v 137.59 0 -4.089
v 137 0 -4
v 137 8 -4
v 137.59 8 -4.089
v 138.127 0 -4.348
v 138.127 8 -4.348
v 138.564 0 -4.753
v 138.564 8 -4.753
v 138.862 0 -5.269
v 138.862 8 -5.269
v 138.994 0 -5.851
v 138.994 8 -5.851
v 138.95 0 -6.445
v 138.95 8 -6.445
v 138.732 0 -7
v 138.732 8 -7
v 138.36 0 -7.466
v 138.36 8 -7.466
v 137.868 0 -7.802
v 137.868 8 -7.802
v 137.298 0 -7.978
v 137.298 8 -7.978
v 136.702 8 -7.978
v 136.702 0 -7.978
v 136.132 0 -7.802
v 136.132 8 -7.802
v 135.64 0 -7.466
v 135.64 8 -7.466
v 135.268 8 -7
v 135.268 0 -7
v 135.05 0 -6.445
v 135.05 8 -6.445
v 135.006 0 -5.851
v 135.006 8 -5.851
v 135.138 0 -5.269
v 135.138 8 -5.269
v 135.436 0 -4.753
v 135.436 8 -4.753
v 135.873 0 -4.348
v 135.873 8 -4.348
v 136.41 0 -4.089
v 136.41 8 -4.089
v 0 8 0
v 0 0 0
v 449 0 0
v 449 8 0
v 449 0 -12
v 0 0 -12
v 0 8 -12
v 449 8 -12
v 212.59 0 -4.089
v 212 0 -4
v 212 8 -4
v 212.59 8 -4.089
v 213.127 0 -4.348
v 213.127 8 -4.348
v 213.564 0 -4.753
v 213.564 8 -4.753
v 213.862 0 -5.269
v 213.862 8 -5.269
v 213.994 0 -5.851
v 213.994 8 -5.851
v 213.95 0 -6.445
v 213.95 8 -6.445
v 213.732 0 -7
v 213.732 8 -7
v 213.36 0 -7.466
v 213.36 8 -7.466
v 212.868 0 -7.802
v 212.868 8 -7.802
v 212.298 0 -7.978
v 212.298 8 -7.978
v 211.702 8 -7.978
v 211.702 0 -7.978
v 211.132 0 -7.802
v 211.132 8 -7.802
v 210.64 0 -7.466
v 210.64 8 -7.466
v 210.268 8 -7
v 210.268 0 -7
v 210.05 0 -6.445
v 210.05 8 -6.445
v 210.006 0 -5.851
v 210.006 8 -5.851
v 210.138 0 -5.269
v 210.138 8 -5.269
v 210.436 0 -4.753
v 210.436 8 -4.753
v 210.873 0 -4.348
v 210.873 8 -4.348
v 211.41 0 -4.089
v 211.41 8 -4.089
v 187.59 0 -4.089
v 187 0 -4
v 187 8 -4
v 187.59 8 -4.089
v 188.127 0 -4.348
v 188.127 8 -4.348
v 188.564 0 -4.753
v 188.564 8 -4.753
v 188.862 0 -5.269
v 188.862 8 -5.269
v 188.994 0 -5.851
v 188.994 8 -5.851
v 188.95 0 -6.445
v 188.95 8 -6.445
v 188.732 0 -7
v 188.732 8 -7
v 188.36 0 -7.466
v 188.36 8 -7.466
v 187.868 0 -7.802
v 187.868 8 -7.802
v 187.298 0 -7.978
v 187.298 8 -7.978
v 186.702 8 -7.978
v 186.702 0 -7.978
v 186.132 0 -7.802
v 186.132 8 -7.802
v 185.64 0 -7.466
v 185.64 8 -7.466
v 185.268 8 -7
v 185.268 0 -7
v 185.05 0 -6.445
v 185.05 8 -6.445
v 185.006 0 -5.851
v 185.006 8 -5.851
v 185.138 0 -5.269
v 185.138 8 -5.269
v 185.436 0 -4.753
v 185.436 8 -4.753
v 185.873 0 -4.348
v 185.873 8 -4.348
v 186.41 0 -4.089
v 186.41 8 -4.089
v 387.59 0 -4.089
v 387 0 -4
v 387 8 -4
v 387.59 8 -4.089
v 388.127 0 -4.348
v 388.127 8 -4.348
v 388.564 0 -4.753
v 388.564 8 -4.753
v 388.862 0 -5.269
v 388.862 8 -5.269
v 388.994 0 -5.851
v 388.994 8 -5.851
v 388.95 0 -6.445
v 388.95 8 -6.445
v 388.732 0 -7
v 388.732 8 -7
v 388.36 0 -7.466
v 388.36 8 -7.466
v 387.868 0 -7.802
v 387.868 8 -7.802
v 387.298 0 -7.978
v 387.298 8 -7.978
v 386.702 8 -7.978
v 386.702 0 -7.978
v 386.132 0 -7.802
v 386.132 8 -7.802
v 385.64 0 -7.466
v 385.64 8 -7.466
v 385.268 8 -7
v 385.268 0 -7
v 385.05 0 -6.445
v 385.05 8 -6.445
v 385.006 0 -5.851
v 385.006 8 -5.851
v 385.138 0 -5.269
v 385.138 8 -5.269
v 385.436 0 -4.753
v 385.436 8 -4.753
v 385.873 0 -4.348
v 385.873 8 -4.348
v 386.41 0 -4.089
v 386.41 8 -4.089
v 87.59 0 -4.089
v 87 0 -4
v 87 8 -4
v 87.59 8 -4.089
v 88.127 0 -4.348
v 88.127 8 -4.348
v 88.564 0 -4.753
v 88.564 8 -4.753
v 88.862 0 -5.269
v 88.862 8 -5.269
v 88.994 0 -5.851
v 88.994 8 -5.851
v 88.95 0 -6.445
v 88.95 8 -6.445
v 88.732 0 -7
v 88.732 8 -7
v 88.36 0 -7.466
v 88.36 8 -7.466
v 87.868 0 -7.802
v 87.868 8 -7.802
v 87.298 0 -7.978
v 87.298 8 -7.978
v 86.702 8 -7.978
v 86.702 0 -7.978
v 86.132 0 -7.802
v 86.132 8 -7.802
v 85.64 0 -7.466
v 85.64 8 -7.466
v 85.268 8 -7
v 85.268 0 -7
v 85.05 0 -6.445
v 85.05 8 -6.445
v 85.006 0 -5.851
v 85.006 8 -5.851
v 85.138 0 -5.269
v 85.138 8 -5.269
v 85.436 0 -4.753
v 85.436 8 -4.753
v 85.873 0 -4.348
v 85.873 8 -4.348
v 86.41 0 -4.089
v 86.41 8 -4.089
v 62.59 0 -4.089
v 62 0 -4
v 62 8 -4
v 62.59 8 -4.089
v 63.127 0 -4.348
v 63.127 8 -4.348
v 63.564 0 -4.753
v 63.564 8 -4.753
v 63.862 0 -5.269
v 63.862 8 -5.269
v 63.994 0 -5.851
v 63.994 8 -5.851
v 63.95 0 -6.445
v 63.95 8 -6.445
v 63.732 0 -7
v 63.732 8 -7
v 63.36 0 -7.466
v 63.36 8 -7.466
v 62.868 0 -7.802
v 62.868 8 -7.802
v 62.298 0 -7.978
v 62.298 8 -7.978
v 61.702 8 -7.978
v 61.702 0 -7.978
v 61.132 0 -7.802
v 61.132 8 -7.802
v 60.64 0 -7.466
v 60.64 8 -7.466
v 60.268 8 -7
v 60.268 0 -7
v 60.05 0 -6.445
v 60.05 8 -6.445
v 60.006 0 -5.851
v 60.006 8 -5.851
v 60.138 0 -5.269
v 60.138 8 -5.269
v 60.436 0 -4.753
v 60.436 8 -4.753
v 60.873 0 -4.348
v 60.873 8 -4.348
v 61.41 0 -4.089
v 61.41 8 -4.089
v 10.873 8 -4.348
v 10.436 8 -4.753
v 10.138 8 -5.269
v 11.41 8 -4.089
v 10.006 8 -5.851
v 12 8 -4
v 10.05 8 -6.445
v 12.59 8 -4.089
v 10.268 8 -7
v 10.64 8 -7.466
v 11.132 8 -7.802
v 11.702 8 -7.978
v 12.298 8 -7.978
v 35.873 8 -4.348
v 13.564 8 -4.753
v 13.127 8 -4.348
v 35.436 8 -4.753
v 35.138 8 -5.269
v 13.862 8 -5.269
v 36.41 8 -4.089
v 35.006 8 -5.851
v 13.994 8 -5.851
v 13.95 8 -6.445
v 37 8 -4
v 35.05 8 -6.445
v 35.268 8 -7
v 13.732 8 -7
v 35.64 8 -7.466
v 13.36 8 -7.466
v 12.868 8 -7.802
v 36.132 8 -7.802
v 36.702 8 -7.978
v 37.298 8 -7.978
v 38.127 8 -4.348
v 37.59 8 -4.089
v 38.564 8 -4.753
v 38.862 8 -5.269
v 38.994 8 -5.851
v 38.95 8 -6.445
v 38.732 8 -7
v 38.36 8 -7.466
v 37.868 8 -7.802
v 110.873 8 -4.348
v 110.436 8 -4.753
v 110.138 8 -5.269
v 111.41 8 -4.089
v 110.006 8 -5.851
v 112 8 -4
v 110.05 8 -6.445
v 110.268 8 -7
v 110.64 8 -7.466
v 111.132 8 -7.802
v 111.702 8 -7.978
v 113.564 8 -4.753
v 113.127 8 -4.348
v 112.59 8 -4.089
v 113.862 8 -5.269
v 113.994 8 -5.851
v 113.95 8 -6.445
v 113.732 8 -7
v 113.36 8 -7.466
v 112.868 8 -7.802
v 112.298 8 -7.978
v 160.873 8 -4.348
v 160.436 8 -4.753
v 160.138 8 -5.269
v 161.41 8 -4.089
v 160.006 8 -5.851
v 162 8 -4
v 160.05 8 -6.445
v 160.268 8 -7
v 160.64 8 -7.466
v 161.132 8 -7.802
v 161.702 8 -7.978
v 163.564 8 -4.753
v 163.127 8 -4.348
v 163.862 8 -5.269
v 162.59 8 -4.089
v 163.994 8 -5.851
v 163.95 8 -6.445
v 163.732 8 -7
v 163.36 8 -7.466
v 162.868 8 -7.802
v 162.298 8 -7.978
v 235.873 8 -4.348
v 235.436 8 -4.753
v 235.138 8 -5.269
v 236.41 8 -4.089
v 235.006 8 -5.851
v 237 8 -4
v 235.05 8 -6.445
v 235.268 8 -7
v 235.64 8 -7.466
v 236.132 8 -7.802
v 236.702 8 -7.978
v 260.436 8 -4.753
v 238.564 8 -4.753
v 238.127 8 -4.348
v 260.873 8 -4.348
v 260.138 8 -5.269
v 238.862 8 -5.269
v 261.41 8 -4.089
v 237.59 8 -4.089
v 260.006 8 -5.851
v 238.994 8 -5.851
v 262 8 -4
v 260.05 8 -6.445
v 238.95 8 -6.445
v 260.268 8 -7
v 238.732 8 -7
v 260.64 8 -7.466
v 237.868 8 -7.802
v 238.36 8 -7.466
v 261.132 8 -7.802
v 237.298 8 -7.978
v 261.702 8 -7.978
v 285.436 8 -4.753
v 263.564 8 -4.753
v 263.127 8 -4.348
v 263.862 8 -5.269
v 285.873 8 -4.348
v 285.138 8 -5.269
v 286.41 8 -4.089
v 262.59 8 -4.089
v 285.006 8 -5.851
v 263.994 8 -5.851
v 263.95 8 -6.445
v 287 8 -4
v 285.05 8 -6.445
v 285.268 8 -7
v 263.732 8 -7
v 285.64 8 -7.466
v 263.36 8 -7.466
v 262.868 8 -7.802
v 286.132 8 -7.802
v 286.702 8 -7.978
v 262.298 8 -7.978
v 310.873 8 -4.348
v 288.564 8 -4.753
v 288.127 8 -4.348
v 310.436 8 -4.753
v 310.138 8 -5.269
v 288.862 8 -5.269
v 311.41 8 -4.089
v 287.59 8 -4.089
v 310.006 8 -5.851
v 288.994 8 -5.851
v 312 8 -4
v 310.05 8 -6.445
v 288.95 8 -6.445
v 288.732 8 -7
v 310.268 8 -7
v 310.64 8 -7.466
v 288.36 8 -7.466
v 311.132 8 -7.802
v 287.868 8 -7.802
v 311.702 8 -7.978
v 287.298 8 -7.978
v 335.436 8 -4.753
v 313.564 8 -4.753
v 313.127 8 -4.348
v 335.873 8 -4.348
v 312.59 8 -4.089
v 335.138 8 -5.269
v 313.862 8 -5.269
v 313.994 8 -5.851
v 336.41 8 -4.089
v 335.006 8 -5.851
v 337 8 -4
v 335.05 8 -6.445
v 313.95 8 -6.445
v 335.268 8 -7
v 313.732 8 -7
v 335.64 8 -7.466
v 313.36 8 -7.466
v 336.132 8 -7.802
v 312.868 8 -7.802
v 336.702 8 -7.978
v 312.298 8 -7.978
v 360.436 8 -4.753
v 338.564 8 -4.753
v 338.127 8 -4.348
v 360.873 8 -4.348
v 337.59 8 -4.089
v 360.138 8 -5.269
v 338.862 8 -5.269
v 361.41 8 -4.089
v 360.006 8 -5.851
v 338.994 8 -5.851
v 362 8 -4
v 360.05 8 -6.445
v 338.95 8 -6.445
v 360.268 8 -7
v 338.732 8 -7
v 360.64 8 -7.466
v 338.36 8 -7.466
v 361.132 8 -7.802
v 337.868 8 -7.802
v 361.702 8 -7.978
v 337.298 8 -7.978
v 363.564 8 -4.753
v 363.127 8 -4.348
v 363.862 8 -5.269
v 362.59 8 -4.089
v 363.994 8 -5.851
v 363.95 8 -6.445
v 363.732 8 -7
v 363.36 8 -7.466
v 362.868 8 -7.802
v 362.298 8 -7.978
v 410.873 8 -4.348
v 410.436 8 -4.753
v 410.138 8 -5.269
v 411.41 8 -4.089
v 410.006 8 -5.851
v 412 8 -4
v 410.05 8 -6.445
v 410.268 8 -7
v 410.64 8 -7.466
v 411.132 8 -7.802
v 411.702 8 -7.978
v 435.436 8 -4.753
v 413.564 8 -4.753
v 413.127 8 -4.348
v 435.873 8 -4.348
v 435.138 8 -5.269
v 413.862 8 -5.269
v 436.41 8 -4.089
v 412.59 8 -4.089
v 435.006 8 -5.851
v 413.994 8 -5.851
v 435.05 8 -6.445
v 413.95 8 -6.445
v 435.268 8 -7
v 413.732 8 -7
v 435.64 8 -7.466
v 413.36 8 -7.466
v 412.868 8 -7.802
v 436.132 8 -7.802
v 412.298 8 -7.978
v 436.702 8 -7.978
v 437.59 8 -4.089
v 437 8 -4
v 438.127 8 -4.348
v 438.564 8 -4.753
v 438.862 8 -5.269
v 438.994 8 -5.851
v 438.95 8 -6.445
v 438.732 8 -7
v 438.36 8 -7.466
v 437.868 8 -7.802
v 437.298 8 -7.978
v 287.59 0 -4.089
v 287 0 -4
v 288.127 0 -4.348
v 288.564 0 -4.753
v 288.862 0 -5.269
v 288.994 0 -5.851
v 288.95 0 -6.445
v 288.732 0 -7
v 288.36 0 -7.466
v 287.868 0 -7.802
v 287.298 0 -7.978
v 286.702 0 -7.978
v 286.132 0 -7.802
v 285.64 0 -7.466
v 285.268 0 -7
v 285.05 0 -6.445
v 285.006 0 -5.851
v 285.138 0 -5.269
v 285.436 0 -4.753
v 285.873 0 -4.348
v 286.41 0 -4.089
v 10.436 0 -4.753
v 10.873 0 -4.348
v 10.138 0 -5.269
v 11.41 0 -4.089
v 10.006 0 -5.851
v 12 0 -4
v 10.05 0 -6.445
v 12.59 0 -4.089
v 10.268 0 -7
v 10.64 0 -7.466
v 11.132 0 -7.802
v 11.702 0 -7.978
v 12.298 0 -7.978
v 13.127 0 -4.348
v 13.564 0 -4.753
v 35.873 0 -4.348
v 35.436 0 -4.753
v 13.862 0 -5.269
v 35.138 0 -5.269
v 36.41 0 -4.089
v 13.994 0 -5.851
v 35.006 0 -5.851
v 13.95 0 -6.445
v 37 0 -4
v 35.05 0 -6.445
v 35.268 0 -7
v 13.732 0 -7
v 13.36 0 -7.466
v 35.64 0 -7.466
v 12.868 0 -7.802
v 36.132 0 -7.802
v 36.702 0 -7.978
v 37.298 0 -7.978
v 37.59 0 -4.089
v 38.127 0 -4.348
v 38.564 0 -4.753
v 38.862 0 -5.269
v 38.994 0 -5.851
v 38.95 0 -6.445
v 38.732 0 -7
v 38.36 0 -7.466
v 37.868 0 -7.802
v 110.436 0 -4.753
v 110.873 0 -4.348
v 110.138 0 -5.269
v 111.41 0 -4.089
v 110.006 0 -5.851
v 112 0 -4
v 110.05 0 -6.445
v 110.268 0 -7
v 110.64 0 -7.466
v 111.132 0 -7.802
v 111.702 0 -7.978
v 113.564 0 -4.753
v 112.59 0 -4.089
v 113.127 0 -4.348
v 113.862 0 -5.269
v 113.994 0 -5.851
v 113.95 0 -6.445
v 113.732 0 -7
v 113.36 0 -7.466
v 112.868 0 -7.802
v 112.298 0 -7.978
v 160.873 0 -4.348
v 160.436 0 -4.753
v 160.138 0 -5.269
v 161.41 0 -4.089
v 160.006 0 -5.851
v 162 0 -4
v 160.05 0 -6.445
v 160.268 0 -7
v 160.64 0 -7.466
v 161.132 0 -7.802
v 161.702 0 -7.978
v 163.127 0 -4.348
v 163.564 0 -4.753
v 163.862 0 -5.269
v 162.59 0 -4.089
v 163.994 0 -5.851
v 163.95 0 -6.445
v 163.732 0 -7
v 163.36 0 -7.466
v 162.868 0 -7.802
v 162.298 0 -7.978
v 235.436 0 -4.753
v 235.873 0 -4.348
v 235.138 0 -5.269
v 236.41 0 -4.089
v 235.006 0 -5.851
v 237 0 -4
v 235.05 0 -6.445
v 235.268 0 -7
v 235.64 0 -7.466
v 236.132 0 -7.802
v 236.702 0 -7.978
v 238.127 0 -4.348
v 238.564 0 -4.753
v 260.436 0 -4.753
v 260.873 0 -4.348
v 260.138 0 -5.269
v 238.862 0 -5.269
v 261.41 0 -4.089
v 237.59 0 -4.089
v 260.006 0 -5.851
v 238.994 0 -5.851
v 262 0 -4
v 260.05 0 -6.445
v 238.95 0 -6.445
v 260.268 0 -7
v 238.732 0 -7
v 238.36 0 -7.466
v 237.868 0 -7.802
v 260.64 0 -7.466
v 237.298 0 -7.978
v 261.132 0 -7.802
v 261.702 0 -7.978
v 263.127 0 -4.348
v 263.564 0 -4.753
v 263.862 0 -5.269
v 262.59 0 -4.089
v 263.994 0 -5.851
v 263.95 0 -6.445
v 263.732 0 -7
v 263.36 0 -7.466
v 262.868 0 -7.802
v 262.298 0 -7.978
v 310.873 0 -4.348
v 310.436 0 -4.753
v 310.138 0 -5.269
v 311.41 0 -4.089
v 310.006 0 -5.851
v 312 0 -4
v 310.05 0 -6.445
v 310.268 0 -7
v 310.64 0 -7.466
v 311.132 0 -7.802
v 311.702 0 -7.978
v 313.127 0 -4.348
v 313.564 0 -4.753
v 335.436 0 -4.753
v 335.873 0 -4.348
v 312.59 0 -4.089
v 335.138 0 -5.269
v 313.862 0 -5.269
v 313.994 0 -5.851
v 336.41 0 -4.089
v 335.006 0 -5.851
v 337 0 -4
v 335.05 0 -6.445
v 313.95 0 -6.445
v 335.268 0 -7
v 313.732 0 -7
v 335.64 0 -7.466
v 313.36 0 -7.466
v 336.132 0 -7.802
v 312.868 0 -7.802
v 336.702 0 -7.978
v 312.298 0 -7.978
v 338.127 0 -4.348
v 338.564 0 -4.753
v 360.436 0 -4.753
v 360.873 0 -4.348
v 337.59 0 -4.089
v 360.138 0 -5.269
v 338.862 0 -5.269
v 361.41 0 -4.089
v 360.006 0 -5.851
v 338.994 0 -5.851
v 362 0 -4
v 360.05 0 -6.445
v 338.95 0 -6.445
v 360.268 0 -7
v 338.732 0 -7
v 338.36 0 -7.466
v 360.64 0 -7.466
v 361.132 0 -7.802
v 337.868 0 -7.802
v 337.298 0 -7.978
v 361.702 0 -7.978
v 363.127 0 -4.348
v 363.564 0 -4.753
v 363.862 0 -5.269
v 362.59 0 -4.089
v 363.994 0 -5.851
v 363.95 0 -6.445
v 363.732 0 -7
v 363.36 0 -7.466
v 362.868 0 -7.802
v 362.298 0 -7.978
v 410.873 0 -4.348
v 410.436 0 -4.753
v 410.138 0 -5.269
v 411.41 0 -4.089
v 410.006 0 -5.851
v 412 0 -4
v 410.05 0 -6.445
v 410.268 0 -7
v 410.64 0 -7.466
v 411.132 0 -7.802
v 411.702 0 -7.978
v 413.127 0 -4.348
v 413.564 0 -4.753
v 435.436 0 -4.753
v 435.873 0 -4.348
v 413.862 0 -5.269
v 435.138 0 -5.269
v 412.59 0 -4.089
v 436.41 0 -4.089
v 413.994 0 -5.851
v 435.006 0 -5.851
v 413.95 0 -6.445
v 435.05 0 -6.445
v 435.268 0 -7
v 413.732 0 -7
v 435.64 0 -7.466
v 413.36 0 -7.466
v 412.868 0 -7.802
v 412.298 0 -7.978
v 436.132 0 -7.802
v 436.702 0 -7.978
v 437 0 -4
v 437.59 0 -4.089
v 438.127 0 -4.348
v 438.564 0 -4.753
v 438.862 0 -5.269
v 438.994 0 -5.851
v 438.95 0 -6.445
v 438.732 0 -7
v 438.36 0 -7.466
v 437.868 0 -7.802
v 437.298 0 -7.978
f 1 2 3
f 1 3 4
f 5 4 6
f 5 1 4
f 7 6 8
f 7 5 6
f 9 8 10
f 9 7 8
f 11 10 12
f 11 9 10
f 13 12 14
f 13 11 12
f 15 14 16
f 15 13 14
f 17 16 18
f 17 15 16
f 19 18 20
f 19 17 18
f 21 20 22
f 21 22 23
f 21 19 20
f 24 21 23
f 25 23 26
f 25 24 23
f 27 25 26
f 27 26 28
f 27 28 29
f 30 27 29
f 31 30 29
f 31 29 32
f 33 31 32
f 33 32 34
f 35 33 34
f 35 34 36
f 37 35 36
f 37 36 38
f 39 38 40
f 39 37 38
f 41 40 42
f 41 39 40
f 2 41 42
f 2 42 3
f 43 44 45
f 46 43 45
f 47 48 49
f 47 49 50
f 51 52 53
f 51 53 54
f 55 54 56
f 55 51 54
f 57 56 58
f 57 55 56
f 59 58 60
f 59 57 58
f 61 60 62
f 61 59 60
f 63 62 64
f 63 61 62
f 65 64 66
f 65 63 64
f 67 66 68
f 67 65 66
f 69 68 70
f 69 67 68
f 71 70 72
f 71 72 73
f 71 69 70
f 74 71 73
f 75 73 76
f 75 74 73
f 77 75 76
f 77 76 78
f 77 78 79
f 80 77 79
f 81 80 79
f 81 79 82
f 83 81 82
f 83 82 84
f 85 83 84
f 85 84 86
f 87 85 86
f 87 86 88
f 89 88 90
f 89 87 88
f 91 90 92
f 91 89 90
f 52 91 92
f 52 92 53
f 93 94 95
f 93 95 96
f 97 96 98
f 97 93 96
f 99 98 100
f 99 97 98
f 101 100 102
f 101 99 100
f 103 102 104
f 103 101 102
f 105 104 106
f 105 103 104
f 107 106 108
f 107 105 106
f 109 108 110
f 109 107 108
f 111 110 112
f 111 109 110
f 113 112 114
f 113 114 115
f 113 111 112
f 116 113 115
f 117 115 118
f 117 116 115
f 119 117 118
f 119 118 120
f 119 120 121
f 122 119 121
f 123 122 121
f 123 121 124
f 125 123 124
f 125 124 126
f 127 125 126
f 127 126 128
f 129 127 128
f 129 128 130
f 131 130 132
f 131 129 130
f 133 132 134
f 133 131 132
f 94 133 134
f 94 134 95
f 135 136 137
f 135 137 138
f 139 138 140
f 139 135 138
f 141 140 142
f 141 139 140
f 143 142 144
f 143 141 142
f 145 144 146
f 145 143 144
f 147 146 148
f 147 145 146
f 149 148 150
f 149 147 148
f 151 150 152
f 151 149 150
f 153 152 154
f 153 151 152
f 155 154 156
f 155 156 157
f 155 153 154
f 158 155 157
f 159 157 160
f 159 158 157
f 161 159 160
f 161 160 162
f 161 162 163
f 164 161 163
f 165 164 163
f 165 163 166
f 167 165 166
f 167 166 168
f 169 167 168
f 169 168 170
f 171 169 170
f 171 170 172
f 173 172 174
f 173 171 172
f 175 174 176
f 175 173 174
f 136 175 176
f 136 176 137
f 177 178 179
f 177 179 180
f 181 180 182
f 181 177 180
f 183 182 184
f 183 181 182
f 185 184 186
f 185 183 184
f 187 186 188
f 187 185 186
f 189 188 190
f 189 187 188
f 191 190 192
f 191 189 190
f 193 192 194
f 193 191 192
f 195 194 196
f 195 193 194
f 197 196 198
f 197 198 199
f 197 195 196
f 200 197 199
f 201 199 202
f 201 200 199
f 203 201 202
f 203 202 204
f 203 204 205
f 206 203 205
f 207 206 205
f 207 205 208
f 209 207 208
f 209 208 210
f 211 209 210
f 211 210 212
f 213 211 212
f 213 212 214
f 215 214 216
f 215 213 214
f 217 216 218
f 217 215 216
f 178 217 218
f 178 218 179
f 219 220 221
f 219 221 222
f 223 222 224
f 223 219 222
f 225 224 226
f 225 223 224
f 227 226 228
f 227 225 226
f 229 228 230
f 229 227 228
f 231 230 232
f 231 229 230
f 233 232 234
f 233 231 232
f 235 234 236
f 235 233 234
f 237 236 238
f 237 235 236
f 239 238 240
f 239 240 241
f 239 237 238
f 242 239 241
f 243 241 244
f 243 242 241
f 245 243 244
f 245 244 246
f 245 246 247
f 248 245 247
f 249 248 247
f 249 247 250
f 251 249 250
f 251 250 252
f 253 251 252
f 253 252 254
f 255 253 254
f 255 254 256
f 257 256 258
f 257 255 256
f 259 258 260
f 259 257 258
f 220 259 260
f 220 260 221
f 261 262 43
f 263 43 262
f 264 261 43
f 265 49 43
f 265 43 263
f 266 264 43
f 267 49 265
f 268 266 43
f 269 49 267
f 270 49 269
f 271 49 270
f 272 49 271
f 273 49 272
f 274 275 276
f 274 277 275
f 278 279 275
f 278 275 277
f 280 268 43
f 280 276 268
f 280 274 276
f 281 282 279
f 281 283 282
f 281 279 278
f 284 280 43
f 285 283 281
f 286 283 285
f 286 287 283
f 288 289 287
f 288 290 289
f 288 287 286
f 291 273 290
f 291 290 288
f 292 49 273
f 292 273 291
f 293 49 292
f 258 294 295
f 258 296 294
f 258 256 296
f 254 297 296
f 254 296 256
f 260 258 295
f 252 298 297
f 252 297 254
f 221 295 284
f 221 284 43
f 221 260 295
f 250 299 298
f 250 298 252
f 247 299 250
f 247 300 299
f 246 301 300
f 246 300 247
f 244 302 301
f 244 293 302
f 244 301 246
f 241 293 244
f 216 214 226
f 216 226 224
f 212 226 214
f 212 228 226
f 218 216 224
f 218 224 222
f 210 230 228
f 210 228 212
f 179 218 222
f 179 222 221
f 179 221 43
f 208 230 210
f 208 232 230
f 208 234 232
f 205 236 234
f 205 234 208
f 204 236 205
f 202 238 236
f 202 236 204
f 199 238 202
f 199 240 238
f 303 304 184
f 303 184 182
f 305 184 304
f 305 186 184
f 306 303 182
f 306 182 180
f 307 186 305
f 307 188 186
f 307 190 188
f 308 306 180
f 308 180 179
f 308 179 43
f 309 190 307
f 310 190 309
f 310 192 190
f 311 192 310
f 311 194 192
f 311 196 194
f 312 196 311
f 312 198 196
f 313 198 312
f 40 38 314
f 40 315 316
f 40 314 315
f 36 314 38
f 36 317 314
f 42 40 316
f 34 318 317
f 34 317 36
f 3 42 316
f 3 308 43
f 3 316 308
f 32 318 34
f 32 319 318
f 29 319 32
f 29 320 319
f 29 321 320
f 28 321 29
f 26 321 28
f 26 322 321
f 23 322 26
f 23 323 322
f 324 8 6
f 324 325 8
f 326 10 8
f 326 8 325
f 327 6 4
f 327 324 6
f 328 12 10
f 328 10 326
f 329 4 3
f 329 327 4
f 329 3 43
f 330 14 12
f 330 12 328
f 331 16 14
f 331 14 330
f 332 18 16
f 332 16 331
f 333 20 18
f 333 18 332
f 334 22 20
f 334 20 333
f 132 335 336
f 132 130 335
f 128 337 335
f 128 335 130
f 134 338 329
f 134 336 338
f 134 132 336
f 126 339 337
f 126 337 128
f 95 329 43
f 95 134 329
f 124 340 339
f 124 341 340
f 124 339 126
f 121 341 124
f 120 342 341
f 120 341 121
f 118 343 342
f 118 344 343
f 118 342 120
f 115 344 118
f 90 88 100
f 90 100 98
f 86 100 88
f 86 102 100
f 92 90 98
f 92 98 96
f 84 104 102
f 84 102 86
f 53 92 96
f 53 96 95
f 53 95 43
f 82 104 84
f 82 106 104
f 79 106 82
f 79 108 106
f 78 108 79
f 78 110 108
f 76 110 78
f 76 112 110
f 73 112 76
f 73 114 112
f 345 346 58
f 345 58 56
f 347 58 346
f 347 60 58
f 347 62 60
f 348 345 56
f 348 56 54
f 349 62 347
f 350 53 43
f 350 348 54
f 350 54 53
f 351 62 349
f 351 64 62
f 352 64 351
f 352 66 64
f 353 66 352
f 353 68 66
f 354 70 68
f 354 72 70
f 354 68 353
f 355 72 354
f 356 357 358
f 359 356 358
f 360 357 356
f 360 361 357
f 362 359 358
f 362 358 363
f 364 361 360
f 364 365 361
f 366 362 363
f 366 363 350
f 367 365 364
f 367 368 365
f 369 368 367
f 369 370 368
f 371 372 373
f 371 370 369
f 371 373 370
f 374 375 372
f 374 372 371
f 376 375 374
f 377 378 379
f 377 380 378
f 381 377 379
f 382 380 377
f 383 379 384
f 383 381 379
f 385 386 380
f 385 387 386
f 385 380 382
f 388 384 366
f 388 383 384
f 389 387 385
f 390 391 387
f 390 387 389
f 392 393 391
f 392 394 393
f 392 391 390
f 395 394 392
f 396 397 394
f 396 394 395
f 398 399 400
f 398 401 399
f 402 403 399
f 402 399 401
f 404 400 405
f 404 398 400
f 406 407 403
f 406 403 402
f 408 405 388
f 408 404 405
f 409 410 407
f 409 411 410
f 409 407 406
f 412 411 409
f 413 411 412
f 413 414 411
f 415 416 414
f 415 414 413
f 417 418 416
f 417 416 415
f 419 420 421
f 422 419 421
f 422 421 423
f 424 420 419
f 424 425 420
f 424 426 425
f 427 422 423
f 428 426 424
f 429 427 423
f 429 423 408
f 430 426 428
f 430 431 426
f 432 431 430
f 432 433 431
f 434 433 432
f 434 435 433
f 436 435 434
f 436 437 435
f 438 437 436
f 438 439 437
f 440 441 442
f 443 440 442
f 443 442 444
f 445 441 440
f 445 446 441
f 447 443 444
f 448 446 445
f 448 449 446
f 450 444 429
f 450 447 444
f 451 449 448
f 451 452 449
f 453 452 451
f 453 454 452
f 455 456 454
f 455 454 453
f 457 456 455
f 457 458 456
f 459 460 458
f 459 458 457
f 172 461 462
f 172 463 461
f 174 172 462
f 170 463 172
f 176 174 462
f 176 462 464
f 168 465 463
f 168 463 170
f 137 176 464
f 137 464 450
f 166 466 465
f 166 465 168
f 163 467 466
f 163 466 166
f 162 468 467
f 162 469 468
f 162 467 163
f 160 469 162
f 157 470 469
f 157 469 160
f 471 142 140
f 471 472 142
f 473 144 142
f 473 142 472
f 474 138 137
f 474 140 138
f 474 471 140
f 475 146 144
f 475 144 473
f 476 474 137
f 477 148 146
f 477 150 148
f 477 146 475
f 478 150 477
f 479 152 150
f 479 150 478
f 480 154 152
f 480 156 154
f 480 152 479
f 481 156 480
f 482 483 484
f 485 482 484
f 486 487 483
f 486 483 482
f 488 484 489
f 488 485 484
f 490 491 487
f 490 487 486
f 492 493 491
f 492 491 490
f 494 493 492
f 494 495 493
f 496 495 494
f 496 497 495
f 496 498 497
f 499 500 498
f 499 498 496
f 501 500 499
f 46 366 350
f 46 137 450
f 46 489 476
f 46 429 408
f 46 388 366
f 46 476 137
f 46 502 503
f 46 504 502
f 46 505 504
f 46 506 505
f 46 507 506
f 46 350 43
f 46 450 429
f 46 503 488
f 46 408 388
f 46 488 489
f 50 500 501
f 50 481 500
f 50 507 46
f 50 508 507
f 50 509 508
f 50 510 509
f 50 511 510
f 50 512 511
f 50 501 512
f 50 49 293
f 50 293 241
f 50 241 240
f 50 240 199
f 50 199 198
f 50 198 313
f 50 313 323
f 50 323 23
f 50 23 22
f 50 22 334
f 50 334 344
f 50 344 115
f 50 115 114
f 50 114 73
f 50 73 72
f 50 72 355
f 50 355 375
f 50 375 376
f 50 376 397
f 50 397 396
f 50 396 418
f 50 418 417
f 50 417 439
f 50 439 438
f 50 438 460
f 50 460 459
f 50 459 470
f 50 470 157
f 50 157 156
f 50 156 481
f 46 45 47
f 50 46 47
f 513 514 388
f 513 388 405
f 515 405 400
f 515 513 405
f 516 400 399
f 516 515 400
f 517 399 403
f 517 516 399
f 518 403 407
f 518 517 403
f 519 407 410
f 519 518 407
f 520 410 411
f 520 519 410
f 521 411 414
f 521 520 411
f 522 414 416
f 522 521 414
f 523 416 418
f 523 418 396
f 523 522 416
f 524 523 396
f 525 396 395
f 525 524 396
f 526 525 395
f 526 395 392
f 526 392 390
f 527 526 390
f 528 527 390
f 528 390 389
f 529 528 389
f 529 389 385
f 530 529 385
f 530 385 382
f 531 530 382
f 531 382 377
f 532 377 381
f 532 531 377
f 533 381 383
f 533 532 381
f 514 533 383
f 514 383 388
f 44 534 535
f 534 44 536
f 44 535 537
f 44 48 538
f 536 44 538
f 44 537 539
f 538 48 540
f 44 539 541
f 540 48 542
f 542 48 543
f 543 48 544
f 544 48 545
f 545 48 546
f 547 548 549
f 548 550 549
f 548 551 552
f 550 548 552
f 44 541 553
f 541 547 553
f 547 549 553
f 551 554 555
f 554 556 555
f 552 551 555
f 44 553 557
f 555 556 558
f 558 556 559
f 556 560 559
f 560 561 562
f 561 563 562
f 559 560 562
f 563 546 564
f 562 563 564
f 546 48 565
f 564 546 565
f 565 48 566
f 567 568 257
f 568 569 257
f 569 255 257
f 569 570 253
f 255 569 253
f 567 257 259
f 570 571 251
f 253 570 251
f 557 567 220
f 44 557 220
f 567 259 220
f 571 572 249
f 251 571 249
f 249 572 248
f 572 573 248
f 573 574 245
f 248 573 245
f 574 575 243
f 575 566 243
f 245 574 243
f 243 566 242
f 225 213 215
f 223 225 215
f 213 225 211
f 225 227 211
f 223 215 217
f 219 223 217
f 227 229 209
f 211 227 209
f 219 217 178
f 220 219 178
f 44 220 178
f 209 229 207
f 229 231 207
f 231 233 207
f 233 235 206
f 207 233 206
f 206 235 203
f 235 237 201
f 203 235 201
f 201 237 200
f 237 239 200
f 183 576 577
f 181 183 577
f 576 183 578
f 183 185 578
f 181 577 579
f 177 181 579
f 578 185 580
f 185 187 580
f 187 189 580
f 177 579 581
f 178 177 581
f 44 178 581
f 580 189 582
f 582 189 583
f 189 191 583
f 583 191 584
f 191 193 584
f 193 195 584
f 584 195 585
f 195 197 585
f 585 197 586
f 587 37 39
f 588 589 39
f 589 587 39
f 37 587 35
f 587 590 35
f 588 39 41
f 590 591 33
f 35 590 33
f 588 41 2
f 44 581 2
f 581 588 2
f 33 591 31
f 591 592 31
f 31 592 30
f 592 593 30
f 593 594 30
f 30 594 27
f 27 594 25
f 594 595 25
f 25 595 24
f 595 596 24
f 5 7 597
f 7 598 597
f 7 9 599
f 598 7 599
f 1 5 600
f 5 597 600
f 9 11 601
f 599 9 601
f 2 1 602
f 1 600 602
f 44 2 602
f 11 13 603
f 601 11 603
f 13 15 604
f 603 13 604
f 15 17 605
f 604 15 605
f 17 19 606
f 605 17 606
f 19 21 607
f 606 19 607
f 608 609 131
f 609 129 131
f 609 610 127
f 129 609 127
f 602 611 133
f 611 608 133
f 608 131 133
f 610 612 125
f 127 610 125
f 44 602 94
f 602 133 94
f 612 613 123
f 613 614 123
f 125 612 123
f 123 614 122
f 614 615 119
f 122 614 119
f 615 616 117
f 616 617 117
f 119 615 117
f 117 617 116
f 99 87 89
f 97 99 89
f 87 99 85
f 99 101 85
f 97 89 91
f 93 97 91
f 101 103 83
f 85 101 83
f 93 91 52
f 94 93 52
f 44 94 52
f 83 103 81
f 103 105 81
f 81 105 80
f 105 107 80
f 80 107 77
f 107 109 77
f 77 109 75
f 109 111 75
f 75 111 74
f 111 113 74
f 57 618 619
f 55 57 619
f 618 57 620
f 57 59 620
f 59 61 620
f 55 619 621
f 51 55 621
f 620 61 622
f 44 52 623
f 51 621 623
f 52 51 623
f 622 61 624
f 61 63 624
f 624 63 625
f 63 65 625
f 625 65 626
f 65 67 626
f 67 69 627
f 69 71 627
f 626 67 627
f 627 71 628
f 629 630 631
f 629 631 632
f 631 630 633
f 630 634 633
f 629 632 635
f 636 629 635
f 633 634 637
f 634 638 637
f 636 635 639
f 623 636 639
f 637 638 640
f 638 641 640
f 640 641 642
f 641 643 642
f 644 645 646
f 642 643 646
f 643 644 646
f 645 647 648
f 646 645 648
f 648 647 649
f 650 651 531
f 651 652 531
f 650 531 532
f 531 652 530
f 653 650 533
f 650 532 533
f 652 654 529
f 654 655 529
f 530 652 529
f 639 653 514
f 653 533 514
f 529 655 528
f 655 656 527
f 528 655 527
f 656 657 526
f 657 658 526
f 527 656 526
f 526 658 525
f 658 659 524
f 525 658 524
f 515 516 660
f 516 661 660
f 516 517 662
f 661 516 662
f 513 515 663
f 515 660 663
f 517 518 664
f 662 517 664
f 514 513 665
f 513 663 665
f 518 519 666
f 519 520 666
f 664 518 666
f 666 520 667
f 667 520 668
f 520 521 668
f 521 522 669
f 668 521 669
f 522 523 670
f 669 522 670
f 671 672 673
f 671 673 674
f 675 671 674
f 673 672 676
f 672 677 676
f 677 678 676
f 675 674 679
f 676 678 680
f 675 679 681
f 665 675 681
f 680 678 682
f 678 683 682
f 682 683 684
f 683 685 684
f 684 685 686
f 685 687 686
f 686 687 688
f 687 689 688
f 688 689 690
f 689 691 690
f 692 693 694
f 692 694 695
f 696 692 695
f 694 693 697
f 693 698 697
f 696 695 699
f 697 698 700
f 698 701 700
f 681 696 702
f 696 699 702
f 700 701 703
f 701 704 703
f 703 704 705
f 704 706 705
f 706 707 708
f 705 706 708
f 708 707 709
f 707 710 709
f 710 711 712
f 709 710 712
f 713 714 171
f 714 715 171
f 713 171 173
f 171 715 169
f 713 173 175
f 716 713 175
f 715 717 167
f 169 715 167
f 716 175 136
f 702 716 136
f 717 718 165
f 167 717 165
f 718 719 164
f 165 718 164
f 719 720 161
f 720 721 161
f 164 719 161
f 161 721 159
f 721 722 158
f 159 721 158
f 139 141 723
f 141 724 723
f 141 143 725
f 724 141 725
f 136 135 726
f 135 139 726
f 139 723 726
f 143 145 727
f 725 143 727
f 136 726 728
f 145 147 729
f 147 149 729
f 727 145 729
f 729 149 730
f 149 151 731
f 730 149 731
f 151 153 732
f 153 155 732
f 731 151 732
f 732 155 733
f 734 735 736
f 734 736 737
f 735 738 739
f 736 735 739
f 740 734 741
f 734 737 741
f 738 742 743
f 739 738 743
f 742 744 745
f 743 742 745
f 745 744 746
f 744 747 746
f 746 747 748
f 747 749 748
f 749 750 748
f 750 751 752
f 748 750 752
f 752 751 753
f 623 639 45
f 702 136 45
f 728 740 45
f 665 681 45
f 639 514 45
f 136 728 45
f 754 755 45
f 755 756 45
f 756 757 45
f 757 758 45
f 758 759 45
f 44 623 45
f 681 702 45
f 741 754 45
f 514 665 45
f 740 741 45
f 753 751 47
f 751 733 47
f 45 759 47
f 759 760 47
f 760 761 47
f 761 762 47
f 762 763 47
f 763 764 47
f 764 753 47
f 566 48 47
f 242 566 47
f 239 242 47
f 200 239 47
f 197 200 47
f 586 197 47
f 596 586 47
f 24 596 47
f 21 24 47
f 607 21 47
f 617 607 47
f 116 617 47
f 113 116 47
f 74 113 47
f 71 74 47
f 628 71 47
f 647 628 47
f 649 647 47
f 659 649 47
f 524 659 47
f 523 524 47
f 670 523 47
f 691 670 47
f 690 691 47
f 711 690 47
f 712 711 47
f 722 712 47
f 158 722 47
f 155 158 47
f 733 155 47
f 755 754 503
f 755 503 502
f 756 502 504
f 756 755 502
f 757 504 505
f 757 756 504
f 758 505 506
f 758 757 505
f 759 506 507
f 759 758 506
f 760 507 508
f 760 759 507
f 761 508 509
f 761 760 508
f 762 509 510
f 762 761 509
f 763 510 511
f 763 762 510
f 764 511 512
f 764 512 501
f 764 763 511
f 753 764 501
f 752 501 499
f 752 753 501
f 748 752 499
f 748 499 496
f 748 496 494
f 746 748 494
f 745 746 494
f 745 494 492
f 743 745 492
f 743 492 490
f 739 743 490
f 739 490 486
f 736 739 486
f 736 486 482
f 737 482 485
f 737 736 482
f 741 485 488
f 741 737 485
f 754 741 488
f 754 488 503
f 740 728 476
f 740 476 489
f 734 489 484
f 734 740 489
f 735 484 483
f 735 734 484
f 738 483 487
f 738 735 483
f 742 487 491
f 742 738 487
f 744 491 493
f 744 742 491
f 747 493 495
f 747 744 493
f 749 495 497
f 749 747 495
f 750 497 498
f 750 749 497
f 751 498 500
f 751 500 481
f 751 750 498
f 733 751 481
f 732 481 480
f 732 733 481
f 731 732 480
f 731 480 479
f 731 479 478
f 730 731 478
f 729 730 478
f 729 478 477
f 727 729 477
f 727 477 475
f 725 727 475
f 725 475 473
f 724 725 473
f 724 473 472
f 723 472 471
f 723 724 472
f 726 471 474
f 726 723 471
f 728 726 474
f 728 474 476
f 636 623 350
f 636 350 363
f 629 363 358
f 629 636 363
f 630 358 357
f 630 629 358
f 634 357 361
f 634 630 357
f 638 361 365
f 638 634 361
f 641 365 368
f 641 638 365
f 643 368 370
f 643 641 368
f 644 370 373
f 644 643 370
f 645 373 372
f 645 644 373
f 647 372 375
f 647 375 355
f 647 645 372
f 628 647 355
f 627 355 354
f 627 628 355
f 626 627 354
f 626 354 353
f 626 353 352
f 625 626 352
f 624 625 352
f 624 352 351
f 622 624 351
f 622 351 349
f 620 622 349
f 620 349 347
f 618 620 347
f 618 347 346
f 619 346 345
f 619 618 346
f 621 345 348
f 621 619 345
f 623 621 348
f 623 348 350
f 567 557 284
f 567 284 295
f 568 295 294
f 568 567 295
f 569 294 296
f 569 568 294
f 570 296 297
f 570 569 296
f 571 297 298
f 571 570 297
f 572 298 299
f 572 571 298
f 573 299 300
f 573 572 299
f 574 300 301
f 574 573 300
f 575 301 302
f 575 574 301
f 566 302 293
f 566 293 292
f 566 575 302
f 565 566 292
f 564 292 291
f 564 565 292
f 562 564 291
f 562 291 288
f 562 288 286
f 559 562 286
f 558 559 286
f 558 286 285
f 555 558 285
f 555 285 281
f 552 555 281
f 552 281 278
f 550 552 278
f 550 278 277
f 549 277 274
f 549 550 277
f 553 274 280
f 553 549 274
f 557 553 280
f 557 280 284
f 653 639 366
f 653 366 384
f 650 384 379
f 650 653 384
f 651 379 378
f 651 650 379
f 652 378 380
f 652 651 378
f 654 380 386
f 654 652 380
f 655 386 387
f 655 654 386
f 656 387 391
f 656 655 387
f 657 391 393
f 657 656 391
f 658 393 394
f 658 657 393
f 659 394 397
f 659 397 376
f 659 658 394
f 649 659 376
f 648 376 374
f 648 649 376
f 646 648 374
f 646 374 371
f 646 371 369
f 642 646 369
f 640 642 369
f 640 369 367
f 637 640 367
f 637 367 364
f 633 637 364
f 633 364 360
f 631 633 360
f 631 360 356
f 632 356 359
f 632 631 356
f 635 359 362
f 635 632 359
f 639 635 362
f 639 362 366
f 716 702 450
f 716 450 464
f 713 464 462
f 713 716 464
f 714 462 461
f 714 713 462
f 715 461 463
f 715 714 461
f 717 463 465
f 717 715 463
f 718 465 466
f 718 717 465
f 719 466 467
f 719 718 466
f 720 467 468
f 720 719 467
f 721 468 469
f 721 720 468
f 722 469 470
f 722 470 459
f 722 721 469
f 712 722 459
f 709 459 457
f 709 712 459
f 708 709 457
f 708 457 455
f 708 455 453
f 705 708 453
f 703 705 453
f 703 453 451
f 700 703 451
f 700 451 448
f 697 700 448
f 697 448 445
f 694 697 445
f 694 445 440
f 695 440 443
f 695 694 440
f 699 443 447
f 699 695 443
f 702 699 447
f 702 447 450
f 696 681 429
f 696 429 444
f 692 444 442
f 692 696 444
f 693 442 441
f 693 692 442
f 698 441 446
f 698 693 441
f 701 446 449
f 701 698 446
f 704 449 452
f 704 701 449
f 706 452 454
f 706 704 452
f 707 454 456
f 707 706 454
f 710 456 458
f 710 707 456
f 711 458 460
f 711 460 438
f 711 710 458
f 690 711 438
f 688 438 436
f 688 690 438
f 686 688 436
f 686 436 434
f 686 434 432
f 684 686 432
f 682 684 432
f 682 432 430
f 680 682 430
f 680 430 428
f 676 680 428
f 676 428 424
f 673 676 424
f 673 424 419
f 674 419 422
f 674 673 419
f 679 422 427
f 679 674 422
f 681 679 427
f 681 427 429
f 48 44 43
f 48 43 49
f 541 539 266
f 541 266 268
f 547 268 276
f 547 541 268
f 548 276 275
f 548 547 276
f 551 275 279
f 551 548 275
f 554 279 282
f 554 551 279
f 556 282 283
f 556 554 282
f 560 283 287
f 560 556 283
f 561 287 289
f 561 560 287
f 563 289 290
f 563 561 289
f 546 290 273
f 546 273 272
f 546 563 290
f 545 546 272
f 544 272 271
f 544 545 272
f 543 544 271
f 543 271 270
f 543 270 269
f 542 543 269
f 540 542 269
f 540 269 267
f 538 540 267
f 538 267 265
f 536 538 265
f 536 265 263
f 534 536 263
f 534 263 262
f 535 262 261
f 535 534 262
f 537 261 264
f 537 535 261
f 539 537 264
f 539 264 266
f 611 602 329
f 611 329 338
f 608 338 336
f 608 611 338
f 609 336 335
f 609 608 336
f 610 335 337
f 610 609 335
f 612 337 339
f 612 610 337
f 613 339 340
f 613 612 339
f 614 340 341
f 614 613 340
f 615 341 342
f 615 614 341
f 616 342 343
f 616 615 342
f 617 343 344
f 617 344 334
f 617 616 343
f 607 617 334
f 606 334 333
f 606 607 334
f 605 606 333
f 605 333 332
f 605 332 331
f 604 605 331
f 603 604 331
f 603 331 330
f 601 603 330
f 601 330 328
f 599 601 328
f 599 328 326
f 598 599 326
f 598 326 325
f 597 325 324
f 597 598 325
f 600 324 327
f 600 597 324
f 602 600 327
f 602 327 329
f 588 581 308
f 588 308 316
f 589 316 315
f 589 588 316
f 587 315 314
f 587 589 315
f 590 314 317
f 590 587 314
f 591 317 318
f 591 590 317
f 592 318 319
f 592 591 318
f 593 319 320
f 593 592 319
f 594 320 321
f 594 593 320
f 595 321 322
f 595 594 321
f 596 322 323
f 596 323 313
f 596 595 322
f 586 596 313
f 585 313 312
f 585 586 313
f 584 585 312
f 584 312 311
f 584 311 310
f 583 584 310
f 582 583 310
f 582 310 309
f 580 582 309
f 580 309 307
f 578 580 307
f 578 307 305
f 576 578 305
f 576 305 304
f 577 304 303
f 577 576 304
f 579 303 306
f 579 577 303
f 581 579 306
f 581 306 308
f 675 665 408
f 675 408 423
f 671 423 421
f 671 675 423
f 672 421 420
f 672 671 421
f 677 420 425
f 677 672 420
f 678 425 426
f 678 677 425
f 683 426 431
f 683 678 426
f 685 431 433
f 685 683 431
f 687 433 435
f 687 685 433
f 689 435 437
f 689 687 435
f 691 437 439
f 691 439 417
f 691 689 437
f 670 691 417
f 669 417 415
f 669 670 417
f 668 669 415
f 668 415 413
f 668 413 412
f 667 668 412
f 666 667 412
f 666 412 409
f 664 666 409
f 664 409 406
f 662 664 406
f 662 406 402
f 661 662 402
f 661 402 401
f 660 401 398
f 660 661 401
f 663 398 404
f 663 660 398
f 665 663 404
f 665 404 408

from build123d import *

# Parameters (mm, degrees)
SKETCH1_W           = 449
SKETCH1_H           = 12
SKETCH1_R           = 2
BOSS_EXTRUDE1_DEPTH = 8


with BuildPart() as part:
    # Sketch1 → Boss-Extrude1 (new body)
    with BuildSketch(Plane(origin=(0, 0, 0), x_dir=(1, 0, 0), z_dir=(0, 1, 0))):
        with Locations((224.5, 6)):
            Rectangle(SKETCH1_W, SKETCH1_H)
        with Locations(Location((12, 6, 0), (0, 0, 270))):
            Circle(SKETCH1_R, mode=Mode.SUBTRACT)
        with Locations(Location((37, 6, 0), (0, 0, 270))):
            Circle(SKETCH1_R, mode=Mode.SUBTRACT)
        with Locations(Location((62, 6, 0), (0, 0, 270))):
            Circle(SKETCH1_R, mode=Mode.SUBTRACT)
        with Locations(Location((87, 6, 0), (0, 0, 270))):
            Circle(SKETCH1_R, mode=Mode.SUBTRACT)
        with Locations(Location((112, 6, 0), (0, 0, 270))):
            Circle(SKETCH1_R, mode=Mode.SUBTRACT)
        with Locations(Location((137, 6, 0), (0, 0, 270))):
            Circle(SKETCH1_R, mode=Mode.SUBTRACT)
        with Locations(Location((162, 6, 0), (0, 0, 270))):
            Circle(SKETCH1_R, mode=Mode.SUBTRACT)
        with Locations(Location((187, 6, 0), (0, 0, 270))):
            Circle(SKETCH1_R, mode=Mode.SUBTRACT)
        with Locations(Location((212, 6, 0), (0, 0, 270))):
            Circle(SKETCH1_R, mode=Mode.SUBTRACT)
        with Locations(Location((237, 6, 0), (0, 0, 270))):
            Circle(SKETCH1_R, mode=Mode.SUBTRACT)
        with Locations(Location((262, 6, 0), (0, 0, 270))):
            Circle(SKETCH1_R, mode=Mode.SUBTRACT)
        with Locations(Location((287, 6, 0), (0, 0, 270))):
            Circle(SKETCH1_R, mode=Mode.SUBTRACT)
        with Locations(Location((312, 6, 0), (0, 0, 270))):
            Circle(SKETCH1_R, mode=Mode.SUBTRACT)
        with Locations(Location((337, 6, 0), (0, 0, 270))):
            Circle(SKETCH1_R, mode=Mode.SUBTRACT)
        with Locations(Location((362, 6, 0), (0, 0, 270))):
            Circle(SKETCH1_R, mode=Mode.SUBTRACT)
        with Locations(Location((387, 6, 0), (0, 0, 270))):
            Circle(SKETCH1_R, mode=Mode.SUBTRACT)
        with Locations(Location((412, 6, 0), (0, 0, 270))):
            Circle(SKETCH1_R, mode=Mode.SUBTRACT)
        with Locations(Location((437, 6, 0), (0, 0, 270))):
            Circle(SKETCH1_R, mode=Mode.SUBTRACT)
    extrude(amount=BOSS_EXTRUDE1_DEPTH)


solid = part.part
